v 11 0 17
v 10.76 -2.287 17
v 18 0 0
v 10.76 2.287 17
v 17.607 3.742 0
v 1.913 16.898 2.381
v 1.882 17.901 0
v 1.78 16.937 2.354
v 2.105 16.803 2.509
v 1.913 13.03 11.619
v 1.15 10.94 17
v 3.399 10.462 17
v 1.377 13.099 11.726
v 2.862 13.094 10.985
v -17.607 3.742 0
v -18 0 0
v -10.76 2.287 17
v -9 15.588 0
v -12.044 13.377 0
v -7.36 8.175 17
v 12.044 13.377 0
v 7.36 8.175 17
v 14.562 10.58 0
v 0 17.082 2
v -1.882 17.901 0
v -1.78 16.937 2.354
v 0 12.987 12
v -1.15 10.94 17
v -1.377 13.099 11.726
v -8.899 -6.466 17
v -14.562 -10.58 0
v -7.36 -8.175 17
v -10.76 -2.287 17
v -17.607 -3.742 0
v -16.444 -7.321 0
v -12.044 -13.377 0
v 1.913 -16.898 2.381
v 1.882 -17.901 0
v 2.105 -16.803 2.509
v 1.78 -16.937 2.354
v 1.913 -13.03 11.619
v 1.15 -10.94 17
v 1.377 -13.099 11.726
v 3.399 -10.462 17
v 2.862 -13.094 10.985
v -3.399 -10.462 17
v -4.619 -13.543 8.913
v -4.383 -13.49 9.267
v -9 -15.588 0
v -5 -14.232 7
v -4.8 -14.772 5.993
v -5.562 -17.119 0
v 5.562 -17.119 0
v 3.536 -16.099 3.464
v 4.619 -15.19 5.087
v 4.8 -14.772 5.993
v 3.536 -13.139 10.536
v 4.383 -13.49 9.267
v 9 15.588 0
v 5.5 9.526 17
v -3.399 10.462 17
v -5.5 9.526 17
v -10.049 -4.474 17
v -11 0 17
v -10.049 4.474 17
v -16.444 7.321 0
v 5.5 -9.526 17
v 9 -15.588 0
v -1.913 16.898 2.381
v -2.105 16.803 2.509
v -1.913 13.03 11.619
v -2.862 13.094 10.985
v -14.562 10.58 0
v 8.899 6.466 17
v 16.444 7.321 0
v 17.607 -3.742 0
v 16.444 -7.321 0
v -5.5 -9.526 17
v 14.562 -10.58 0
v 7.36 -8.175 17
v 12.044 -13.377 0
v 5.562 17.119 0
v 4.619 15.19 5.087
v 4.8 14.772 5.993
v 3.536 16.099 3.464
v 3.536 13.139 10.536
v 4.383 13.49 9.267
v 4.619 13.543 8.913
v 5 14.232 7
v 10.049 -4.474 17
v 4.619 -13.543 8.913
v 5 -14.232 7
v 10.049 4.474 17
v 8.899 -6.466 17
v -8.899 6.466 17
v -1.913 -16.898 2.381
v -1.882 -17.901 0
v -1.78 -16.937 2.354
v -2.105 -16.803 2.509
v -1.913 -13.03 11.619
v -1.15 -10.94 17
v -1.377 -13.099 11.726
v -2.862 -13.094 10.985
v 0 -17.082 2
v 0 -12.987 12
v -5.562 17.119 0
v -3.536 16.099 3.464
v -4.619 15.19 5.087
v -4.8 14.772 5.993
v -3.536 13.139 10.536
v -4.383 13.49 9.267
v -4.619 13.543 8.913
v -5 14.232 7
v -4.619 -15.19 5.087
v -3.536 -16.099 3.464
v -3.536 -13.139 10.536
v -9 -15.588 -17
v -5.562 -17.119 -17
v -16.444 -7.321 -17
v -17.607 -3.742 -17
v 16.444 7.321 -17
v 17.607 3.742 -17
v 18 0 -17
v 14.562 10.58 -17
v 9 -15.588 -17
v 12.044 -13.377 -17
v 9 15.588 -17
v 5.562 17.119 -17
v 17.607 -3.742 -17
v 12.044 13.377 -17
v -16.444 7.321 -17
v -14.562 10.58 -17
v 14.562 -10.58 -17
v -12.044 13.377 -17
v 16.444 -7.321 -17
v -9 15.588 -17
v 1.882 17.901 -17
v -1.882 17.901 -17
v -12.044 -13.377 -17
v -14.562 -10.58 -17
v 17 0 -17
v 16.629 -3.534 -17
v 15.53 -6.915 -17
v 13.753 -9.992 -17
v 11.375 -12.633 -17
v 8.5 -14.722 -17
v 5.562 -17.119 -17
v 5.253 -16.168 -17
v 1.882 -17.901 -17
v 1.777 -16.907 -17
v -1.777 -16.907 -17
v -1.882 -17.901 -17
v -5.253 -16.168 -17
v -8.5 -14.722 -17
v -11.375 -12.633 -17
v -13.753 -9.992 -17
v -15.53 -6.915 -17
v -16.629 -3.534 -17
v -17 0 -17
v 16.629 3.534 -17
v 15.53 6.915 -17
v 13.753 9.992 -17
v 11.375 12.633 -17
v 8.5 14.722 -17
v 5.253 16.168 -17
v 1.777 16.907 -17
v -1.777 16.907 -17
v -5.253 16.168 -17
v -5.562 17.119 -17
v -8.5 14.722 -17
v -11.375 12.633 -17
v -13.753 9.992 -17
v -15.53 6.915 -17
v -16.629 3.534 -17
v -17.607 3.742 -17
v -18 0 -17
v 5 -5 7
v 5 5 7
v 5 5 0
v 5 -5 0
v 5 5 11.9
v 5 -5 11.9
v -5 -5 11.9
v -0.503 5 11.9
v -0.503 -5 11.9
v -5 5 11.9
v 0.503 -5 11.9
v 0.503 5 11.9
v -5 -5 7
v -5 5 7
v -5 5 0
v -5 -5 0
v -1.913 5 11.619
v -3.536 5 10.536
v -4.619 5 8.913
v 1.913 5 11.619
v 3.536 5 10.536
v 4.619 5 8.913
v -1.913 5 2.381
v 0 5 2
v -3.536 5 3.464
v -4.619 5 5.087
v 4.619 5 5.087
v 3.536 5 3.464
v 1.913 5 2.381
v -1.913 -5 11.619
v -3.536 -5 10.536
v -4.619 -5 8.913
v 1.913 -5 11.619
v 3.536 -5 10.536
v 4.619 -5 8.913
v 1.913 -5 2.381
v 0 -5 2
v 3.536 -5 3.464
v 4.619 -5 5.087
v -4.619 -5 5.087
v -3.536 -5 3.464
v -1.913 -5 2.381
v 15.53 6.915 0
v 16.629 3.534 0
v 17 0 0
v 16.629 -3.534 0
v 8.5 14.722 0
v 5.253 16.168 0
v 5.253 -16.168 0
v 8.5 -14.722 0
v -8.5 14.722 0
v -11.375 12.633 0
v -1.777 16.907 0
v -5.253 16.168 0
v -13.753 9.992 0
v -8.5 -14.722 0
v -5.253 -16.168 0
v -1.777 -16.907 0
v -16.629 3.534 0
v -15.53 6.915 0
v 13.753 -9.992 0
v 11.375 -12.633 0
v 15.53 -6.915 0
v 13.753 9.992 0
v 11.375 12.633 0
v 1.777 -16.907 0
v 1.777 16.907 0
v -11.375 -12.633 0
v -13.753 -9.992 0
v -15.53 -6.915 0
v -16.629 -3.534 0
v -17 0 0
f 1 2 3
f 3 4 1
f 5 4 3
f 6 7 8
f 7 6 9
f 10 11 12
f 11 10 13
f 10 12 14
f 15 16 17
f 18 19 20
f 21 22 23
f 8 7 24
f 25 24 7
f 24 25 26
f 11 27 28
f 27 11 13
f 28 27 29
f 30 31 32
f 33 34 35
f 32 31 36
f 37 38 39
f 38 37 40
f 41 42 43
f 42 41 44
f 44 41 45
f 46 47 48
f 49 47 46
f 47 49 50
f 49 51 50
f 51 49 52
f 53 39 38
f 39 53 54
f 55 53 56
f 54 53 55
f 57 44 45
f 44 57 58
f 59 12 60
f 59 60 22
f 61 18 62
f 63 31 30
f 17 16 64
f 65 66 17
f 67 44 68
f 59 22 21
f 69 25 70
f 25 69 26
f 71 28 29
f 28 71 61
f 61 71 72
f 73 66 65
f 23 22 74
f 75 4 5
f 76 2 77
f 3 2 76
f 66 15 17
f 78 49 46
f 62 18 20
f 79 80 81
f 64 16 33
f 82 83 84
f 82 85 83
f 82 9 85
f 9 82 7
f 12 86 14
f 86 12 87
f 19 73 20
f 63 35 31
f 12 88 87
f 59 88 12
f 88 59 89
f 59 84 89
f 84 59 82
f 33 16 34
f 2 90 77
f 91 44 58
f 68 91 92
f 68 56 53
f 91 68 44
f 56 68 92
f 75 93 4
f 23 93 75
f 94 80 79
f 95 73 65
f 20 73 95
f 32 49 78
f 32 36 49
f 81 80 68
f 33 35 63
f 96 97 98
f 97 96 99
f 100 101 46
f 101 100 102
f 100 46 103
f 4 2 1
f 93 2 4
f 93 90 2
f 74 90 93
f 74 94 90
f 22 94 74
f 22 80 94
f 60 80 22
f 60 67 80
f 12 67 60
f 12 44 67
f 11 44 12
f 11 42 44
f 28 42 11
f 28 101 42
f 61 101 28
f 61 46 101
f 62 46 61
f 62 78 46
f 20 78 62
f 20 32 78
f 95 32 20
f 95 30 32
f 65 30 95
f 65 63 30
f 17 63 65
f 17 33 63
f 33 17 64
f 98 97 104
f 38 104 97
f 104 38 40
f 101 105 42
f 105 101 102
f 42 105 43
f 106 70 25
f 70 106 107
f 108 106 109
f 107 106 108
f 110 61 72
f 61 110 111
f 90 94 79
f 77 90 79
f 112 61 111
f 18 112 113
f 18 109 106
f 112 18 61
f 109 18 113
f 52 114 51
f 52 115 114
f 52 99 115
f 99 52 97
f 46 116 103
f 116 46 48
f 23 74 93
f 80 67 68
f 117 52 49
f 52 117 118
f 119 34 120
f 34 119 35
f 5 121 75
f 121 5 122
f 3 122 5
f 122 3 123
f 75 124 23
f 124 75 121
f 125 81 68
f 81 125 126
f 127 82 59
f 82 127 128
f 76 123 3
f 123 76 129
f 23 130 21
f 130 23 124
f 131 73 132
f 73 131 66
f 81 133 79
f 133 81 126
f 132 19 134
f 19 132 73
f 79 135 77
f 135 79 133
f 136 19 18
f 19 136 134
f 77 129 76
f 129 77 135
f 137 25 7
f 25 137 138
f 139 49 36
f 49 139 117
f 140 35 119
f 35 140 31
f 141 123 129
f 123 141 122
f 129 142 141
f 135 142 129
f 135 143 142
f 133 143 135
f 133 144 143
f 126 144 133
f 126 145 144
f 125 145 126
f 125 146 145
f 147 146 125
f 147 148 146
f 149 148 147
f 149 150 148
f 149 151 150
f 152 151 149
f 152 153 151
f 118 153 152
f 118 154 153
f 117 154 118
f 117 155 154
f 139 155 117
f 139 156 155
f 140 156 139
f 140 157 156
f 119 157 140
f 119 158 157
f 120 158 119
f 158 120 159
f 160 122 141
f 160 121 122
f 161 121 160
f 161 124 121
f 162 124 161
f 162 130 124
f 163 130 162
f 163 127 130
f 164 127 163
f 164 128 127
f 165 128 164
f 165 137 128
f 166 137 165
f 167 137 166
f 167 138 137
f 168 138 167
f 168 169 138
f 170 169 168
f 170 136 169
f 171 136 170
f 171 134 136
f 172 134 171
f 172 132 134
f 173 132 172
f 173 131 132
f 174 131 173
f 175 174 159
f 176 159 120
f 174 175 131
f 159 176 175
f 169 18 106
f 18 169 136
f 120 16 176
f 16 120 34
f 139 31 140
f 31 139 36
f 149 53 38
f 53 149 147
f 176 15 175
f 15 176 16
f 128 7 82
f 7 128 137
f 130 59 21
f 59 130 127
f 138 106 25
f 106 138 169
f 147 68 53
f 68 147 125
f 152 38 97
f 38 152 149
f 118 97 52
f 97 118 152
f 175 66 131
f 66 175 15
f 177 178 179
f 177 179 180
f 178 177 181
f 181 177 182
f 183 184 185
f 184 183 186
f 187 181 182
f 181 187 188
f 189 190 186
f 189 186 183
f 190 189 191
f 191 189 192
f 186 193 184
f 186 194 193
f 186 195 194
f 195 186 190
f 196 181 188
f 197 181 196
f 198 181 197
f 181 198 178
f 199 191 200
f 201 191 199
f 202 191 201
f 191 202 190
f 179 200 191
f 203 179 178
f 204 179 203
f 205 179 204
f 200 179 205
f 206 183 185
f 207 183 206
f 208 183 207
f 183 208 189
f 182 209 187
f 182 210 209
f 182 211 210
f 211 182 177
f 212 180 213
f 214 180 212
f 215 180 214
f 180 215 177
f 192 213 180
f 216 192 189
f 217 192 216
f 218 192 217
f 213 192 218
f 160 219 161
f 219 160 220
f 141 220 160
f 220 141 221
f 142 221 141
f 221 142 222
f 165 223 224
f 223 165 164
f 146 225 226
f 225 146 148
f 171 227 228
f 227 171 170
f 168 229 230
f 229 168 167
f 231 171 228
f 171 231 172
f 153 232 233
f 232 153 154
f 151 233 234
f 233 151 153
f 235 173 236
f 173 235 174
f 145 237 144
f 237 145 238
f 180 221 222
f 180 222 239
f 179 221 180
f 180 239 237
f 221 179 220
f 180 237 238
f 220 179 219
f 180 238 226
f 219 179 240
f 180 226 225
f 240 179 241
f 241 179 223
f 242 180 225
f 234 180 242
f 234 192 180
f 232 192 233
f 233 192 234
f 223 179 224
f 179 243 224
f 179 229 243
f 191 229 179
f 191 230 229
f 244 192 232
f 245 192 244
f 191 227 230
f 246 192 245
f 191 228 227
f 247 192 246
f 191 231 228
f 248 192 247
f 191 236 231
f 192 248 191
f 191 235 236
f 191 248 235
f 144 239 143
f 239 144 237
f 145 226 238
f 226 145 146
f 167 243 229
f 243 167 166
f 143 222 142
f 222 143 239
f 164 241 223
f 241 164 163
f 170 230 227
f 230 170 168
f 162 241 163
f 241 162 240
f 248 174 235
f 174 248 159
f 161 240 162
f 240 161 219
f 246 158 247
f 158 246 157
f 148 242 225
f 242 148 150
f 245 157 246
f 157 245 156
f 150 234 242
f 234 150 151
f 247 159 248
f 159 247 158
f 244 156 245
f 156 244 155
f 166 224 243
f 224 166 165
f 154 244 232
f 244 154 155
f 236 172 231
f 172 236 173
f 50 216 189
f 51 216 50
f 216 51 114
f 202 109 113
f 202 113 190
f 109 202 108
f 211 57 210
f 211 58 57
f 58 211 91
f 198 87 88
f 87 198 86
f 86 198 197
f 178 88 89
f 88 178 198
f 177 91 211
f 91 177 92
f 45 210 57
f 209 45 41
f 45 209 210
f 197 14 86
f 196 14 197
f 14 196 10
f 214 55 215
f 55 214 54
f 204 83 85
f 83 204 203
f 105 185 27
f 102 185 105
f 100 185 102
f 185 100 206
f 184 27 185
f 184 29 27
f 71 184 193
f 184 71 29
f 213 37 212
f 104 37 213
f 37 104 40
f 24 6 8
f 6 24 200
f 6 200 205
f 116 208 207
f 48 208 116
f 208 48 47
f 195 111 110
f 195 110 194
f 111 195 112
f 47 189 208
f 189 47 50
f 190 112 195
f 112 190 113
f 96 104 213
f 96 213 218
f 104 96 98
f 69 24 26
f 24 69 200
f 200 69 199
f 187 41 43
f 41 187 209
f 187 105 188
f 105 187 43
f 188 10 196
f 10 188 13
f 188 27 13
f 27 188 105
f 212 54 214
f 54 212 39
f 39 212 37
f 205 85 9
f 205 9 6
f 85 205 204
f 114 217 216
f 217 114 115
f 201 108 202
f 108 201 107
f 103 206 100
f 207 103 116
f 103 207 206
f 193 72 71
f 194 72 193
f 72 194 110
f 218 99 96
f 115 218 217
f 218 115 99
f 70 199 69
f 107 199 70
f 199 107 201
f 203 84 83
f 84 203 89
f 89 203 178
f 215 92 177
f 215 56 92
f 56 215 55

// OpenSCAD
difference(){
union(){
cylinder(d1=36,d2=22,h=17);
translate([0,0,-17])
cylinder(d=36,h=17);
}

translate([0,0,5.9])
cube([10,10,12],center=true);

translate([0,0,-18])
cylinder(d=34,h=18);

translate([0,0,7])
rotate([90,0,0])
cylinder(d=10,h=50,center=true);
}
